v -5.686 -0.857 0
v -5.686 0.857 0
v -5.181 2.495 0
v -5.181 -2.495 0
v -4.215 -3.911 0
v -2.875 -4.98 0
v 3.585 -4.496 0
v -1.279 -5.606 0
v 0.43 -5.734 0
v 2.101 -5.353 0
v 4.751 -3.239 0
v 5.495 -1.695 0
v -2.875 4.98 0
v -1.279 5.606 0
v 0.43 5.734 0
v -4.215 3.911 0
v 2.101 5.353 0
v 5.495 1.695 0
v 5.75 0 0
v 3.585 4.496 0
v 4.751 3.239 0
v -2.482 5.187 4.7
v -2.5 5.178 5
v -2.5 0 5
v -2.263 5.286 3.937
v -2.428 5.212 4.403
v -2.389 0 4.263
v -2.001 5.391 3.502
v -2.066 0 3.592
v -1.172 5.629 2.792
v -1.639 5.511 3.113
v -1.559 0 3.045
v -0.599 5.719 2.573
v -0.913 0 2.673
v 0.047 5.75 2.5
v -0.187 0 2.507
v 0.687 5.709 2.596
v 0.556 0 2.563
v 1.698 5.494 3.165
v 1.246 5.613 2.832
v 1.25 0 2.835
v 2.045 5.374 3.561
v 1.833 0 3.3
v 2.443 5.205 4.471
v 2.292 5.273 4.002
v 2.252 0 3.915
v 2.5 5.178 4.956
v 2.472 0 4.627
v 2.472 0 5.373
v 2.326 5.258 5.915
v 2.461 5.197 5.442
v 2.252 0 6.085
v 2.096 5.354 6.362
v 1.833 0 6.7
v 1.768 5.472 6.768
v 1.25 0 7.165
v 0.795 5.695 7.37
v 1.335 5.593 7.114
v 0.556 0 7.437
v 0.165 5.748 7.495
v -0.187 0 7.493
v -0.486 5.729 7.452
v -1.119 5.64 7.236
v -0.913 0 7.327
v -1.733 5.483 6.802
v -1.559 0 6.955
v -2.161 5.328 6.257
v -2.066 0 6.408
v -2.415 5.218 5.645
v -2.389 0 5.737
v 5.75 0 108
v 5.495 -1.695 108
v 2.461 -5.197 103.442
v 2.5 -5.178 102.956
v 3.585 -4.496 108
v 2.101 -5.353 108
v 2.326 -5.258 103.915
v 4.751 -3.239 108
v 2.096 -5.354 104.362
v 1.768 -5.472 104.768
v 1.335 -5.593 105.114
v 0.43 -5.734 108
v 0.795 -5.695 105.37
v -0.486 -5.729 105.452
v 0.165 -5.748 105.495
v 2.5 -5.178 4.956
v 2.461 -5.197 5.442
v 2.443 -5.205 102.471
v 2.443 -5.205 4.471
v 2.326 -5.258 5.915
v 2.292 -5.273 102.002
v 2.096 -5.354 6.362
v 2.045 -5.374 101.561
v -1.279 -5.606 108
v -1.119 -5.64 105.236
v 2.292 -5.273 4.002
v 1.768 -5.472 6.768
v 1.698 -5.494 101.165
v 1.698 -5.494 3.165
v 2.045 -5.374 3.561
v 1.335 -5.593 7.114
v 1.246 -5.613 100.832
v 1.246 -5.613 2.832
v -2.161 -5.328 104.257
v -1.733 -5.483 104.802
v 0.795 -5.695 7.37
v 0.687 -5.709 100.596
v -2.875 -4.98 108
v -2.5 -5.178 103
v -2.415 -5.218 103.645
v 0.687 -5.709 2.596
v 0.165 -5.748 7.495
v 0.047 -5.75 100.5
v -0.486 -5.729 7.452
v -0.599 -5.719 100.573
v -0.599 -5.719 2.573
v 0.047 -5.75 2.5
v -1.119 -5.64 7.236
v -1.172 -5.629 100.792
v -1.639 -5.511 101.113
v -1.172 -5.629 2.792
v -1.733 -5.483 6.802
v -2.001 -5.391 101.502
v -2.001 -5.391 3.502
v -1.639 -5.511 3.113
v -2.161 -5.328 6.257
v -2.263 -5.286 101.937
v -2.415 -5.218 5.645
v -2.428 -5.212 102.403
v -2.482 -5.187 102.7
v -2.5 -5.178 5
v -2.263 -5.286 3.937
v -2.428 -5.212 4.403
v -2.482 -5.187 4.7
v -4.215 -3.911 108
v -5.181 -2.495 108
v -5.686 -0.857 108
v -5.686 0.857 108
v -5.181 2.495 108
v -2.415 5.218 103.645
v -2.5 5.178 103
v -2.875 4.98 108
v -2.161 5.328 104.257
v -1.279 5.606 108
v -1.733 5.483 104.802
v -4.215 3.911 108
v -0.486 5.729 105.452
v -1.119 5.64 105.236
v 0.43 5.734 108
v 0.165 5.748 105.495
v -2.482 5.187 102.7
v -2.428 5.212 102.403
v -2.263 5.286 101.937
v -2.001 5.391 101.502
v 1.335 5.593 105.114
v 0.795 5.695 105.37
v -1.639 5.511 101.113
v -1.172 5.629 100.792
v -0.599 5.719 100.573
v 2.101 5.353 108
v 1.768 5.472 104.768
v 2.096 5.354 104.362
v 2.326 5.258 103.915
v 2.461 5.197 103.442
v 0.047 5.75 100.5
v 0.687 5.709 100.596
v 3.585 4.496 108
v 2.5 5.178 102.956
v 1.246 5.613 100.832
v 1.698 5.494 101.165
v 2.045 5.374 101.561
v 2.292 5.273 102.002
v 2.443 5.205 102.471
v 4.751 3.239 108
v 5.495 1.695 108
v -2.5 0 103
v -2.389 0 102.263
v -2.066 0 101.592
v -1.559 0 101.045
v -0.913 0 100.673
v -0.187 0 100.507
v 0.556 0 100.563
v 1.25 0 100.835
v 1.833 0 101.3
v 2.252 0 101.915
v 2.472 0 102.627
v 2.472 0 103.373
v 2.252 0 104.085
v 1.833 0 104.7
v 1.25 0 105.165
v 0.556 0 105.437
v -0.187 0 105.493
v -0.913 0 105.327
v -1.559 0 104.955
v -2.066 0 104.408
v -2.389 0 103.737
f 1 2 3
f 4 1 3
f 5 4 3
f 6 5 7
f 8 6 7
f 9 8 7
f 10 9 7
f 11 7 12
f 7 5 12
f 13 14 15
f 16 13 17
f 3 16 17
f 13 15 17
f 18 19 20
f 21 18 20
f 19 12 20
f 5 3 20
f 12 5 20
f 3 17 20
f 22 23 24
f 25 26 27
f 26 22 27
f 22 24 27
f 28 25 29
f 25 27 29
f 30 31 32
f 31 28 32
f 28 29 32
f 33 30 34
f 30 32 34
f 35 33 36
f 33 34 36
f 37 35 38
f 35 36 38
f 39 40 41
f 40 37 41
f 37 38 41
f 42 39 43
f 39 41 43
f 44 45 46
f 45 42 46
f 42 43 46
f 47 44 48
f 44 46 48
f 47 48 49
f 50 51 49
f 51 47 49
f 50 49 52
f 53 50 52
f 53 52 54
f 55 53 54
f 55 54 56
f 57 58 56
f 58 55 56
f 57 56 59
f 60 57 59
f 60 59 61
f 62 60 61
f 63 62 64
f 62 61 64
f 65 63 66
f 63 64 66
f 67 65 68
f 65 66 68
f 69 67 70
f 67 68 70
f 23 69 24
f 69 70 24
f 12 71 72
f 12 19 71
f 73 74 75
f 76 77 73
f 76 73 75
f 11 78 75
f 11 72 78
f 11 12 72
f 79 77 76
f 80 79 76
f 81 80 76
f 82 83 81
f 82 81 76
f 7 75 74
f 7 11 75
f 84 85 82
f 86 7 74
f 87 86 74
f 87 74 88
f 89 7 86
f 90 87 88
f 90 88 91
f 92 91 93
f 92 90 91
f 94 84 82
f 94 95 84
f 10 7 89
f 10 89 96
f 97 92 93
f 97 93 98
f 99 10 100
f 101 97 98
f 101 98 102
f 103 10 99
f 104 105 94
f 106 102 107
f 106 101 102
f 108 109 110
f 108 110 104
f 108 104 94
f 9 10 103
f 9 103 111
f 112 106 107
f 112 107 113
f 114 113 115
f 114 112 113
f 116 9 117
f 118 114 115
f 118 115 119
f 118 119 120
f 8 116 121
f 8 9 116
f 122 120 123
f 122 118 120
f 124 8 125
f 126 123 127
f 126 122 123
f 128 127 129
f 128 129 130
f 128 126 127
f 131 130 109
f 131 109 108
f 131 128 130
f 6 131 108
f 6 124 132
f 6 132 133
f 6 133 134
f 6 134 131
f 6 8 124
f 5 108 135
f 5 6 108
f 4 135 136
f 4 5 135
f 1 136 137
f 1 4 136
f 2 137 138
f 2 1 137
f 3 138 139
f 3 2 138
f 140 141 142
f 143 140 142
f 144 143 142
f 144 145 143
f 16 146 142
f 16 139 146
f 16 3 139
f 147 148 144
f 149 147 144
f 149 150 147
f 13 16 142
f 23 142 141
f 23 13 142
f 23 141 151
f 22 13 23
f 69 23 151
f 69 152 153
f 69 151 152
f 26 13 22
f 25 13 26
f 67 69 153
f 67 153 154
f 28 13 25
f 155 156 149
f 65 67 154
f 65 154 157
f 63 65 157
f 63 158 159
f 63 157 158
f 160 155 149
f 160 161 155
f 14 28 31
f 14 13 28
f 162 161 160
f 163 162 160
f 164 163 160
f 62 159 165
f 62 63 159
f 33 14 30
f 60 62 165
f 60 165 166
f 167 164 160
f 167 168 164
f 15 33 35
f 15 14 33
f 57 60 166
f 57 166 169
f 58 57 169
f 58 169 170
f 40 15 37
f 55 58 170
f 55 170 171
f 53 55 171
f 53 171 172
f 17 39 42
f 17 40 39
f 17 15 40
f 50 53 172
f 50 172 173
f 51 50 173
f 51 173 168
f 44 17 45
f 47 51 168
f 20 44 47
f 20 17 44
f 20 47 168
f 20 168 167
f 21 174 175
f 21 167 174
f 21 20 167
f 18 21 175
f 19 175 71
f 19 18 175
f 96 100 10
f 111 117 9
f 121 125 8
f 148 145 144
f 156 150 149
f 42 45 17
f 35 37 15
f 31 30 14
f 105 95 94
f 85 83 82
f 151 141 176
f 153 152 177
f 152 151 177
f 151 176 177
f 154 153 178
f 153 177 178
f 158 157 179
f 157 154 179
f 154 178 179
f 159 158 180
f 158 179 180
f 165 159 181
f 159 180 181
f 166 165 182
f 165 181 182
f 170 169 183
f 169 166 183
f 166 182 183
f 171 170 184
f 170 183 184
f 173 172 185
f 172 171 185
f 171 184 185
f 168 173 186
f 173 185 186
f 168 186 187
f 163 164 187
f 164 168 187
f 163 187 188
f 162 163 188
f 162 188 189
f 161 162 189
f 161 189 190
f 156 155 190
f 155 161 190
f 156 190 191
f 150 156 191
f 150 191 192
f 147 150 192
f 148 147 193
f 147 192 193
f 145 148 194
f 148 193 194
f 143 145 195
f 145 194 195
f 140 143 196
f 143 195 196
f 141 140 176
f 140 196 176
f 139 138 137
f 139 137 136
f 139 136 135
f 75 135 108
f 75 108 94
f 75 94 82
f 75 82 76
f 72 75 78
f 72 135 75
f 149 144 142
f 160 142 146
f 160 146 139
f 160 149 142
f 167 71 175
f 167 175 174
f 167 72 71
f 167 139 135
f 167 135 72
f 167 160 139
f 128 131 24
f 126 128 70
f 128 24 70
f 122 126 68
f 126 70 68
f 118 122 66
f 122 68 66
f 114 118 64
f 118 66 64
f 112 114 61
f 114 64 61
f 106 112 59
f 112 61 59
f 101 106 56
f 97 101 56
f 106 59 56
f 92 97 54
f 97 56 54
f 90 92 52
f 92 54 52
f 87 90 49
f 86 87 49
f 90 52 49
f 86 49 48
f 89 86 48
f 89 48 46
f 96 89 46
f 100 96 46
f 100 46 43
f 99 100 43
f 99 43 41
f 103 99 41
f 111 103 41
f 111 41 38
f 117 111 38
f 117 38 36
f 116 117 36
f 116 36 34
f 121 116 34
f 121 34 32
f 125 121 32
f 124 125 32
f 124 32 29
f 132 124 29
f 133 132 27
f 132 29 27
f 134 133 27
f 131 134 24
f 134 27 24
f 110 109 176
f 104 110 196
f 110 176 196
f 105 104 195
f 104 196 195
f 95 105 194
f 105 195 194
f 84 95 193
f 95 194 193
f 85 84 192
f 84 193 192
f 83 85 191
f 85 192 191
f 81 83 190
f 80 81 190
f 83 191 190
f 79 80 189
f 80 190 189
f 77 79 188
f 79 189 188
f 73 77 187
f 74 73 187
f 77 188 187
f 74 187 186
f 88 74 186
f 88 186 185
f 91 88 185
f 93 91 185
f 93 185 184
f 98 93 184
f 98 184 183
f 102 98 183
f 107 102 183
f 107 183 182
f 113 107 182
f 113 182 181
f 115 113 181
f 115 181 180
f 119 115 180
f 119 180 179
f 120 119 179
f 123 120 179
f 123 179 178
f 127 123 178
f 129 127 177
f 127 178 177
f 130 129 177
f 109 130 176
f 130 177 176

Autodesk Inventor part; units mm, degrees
ref_plane "YZ Plane" through (0, 0, 0) normal (1, 0, 0) x (0, 1, 0)
ref_plane "XZ Plane" through (0, 0, 0) normal (0, 1, 0) x (-1, 0, 0)
ref_plane "XY Plane" through (0, 0, 0) normal (0, 0, 1) x (1, 0, 0)
sketch "Sketch1" plane through (0, 0, 0) normal (0, 0, 1) x (1, 0, 0)
  circle A0 centre (0, 0) radius 5.75
  dimension "d0" = 11.5
extrude "Extrusion1" add sketch "Sketch1" along normal blind 108
sketch "Sketch2" plane through (0, 0, 0) normal (0, 1, 0) x (-1, 0, 0)
  circle A0 centre (0, 103) radius 2.5
  line L0 (5.75, 108) -> (-5.75, 108) projected
  circle A1 centre (0, 5) radius 2.5
  point P0 (0, 0)
  dimension "d3" = 5
  dimension "d7" = 5
  dimension "d8" = 5
  dimension "d9" = 5
extrude "Extrusion2" cut sketch "Sketch2" along normal through all both and the other way through all
properties part number "WA001" material "Stainless Steel"
